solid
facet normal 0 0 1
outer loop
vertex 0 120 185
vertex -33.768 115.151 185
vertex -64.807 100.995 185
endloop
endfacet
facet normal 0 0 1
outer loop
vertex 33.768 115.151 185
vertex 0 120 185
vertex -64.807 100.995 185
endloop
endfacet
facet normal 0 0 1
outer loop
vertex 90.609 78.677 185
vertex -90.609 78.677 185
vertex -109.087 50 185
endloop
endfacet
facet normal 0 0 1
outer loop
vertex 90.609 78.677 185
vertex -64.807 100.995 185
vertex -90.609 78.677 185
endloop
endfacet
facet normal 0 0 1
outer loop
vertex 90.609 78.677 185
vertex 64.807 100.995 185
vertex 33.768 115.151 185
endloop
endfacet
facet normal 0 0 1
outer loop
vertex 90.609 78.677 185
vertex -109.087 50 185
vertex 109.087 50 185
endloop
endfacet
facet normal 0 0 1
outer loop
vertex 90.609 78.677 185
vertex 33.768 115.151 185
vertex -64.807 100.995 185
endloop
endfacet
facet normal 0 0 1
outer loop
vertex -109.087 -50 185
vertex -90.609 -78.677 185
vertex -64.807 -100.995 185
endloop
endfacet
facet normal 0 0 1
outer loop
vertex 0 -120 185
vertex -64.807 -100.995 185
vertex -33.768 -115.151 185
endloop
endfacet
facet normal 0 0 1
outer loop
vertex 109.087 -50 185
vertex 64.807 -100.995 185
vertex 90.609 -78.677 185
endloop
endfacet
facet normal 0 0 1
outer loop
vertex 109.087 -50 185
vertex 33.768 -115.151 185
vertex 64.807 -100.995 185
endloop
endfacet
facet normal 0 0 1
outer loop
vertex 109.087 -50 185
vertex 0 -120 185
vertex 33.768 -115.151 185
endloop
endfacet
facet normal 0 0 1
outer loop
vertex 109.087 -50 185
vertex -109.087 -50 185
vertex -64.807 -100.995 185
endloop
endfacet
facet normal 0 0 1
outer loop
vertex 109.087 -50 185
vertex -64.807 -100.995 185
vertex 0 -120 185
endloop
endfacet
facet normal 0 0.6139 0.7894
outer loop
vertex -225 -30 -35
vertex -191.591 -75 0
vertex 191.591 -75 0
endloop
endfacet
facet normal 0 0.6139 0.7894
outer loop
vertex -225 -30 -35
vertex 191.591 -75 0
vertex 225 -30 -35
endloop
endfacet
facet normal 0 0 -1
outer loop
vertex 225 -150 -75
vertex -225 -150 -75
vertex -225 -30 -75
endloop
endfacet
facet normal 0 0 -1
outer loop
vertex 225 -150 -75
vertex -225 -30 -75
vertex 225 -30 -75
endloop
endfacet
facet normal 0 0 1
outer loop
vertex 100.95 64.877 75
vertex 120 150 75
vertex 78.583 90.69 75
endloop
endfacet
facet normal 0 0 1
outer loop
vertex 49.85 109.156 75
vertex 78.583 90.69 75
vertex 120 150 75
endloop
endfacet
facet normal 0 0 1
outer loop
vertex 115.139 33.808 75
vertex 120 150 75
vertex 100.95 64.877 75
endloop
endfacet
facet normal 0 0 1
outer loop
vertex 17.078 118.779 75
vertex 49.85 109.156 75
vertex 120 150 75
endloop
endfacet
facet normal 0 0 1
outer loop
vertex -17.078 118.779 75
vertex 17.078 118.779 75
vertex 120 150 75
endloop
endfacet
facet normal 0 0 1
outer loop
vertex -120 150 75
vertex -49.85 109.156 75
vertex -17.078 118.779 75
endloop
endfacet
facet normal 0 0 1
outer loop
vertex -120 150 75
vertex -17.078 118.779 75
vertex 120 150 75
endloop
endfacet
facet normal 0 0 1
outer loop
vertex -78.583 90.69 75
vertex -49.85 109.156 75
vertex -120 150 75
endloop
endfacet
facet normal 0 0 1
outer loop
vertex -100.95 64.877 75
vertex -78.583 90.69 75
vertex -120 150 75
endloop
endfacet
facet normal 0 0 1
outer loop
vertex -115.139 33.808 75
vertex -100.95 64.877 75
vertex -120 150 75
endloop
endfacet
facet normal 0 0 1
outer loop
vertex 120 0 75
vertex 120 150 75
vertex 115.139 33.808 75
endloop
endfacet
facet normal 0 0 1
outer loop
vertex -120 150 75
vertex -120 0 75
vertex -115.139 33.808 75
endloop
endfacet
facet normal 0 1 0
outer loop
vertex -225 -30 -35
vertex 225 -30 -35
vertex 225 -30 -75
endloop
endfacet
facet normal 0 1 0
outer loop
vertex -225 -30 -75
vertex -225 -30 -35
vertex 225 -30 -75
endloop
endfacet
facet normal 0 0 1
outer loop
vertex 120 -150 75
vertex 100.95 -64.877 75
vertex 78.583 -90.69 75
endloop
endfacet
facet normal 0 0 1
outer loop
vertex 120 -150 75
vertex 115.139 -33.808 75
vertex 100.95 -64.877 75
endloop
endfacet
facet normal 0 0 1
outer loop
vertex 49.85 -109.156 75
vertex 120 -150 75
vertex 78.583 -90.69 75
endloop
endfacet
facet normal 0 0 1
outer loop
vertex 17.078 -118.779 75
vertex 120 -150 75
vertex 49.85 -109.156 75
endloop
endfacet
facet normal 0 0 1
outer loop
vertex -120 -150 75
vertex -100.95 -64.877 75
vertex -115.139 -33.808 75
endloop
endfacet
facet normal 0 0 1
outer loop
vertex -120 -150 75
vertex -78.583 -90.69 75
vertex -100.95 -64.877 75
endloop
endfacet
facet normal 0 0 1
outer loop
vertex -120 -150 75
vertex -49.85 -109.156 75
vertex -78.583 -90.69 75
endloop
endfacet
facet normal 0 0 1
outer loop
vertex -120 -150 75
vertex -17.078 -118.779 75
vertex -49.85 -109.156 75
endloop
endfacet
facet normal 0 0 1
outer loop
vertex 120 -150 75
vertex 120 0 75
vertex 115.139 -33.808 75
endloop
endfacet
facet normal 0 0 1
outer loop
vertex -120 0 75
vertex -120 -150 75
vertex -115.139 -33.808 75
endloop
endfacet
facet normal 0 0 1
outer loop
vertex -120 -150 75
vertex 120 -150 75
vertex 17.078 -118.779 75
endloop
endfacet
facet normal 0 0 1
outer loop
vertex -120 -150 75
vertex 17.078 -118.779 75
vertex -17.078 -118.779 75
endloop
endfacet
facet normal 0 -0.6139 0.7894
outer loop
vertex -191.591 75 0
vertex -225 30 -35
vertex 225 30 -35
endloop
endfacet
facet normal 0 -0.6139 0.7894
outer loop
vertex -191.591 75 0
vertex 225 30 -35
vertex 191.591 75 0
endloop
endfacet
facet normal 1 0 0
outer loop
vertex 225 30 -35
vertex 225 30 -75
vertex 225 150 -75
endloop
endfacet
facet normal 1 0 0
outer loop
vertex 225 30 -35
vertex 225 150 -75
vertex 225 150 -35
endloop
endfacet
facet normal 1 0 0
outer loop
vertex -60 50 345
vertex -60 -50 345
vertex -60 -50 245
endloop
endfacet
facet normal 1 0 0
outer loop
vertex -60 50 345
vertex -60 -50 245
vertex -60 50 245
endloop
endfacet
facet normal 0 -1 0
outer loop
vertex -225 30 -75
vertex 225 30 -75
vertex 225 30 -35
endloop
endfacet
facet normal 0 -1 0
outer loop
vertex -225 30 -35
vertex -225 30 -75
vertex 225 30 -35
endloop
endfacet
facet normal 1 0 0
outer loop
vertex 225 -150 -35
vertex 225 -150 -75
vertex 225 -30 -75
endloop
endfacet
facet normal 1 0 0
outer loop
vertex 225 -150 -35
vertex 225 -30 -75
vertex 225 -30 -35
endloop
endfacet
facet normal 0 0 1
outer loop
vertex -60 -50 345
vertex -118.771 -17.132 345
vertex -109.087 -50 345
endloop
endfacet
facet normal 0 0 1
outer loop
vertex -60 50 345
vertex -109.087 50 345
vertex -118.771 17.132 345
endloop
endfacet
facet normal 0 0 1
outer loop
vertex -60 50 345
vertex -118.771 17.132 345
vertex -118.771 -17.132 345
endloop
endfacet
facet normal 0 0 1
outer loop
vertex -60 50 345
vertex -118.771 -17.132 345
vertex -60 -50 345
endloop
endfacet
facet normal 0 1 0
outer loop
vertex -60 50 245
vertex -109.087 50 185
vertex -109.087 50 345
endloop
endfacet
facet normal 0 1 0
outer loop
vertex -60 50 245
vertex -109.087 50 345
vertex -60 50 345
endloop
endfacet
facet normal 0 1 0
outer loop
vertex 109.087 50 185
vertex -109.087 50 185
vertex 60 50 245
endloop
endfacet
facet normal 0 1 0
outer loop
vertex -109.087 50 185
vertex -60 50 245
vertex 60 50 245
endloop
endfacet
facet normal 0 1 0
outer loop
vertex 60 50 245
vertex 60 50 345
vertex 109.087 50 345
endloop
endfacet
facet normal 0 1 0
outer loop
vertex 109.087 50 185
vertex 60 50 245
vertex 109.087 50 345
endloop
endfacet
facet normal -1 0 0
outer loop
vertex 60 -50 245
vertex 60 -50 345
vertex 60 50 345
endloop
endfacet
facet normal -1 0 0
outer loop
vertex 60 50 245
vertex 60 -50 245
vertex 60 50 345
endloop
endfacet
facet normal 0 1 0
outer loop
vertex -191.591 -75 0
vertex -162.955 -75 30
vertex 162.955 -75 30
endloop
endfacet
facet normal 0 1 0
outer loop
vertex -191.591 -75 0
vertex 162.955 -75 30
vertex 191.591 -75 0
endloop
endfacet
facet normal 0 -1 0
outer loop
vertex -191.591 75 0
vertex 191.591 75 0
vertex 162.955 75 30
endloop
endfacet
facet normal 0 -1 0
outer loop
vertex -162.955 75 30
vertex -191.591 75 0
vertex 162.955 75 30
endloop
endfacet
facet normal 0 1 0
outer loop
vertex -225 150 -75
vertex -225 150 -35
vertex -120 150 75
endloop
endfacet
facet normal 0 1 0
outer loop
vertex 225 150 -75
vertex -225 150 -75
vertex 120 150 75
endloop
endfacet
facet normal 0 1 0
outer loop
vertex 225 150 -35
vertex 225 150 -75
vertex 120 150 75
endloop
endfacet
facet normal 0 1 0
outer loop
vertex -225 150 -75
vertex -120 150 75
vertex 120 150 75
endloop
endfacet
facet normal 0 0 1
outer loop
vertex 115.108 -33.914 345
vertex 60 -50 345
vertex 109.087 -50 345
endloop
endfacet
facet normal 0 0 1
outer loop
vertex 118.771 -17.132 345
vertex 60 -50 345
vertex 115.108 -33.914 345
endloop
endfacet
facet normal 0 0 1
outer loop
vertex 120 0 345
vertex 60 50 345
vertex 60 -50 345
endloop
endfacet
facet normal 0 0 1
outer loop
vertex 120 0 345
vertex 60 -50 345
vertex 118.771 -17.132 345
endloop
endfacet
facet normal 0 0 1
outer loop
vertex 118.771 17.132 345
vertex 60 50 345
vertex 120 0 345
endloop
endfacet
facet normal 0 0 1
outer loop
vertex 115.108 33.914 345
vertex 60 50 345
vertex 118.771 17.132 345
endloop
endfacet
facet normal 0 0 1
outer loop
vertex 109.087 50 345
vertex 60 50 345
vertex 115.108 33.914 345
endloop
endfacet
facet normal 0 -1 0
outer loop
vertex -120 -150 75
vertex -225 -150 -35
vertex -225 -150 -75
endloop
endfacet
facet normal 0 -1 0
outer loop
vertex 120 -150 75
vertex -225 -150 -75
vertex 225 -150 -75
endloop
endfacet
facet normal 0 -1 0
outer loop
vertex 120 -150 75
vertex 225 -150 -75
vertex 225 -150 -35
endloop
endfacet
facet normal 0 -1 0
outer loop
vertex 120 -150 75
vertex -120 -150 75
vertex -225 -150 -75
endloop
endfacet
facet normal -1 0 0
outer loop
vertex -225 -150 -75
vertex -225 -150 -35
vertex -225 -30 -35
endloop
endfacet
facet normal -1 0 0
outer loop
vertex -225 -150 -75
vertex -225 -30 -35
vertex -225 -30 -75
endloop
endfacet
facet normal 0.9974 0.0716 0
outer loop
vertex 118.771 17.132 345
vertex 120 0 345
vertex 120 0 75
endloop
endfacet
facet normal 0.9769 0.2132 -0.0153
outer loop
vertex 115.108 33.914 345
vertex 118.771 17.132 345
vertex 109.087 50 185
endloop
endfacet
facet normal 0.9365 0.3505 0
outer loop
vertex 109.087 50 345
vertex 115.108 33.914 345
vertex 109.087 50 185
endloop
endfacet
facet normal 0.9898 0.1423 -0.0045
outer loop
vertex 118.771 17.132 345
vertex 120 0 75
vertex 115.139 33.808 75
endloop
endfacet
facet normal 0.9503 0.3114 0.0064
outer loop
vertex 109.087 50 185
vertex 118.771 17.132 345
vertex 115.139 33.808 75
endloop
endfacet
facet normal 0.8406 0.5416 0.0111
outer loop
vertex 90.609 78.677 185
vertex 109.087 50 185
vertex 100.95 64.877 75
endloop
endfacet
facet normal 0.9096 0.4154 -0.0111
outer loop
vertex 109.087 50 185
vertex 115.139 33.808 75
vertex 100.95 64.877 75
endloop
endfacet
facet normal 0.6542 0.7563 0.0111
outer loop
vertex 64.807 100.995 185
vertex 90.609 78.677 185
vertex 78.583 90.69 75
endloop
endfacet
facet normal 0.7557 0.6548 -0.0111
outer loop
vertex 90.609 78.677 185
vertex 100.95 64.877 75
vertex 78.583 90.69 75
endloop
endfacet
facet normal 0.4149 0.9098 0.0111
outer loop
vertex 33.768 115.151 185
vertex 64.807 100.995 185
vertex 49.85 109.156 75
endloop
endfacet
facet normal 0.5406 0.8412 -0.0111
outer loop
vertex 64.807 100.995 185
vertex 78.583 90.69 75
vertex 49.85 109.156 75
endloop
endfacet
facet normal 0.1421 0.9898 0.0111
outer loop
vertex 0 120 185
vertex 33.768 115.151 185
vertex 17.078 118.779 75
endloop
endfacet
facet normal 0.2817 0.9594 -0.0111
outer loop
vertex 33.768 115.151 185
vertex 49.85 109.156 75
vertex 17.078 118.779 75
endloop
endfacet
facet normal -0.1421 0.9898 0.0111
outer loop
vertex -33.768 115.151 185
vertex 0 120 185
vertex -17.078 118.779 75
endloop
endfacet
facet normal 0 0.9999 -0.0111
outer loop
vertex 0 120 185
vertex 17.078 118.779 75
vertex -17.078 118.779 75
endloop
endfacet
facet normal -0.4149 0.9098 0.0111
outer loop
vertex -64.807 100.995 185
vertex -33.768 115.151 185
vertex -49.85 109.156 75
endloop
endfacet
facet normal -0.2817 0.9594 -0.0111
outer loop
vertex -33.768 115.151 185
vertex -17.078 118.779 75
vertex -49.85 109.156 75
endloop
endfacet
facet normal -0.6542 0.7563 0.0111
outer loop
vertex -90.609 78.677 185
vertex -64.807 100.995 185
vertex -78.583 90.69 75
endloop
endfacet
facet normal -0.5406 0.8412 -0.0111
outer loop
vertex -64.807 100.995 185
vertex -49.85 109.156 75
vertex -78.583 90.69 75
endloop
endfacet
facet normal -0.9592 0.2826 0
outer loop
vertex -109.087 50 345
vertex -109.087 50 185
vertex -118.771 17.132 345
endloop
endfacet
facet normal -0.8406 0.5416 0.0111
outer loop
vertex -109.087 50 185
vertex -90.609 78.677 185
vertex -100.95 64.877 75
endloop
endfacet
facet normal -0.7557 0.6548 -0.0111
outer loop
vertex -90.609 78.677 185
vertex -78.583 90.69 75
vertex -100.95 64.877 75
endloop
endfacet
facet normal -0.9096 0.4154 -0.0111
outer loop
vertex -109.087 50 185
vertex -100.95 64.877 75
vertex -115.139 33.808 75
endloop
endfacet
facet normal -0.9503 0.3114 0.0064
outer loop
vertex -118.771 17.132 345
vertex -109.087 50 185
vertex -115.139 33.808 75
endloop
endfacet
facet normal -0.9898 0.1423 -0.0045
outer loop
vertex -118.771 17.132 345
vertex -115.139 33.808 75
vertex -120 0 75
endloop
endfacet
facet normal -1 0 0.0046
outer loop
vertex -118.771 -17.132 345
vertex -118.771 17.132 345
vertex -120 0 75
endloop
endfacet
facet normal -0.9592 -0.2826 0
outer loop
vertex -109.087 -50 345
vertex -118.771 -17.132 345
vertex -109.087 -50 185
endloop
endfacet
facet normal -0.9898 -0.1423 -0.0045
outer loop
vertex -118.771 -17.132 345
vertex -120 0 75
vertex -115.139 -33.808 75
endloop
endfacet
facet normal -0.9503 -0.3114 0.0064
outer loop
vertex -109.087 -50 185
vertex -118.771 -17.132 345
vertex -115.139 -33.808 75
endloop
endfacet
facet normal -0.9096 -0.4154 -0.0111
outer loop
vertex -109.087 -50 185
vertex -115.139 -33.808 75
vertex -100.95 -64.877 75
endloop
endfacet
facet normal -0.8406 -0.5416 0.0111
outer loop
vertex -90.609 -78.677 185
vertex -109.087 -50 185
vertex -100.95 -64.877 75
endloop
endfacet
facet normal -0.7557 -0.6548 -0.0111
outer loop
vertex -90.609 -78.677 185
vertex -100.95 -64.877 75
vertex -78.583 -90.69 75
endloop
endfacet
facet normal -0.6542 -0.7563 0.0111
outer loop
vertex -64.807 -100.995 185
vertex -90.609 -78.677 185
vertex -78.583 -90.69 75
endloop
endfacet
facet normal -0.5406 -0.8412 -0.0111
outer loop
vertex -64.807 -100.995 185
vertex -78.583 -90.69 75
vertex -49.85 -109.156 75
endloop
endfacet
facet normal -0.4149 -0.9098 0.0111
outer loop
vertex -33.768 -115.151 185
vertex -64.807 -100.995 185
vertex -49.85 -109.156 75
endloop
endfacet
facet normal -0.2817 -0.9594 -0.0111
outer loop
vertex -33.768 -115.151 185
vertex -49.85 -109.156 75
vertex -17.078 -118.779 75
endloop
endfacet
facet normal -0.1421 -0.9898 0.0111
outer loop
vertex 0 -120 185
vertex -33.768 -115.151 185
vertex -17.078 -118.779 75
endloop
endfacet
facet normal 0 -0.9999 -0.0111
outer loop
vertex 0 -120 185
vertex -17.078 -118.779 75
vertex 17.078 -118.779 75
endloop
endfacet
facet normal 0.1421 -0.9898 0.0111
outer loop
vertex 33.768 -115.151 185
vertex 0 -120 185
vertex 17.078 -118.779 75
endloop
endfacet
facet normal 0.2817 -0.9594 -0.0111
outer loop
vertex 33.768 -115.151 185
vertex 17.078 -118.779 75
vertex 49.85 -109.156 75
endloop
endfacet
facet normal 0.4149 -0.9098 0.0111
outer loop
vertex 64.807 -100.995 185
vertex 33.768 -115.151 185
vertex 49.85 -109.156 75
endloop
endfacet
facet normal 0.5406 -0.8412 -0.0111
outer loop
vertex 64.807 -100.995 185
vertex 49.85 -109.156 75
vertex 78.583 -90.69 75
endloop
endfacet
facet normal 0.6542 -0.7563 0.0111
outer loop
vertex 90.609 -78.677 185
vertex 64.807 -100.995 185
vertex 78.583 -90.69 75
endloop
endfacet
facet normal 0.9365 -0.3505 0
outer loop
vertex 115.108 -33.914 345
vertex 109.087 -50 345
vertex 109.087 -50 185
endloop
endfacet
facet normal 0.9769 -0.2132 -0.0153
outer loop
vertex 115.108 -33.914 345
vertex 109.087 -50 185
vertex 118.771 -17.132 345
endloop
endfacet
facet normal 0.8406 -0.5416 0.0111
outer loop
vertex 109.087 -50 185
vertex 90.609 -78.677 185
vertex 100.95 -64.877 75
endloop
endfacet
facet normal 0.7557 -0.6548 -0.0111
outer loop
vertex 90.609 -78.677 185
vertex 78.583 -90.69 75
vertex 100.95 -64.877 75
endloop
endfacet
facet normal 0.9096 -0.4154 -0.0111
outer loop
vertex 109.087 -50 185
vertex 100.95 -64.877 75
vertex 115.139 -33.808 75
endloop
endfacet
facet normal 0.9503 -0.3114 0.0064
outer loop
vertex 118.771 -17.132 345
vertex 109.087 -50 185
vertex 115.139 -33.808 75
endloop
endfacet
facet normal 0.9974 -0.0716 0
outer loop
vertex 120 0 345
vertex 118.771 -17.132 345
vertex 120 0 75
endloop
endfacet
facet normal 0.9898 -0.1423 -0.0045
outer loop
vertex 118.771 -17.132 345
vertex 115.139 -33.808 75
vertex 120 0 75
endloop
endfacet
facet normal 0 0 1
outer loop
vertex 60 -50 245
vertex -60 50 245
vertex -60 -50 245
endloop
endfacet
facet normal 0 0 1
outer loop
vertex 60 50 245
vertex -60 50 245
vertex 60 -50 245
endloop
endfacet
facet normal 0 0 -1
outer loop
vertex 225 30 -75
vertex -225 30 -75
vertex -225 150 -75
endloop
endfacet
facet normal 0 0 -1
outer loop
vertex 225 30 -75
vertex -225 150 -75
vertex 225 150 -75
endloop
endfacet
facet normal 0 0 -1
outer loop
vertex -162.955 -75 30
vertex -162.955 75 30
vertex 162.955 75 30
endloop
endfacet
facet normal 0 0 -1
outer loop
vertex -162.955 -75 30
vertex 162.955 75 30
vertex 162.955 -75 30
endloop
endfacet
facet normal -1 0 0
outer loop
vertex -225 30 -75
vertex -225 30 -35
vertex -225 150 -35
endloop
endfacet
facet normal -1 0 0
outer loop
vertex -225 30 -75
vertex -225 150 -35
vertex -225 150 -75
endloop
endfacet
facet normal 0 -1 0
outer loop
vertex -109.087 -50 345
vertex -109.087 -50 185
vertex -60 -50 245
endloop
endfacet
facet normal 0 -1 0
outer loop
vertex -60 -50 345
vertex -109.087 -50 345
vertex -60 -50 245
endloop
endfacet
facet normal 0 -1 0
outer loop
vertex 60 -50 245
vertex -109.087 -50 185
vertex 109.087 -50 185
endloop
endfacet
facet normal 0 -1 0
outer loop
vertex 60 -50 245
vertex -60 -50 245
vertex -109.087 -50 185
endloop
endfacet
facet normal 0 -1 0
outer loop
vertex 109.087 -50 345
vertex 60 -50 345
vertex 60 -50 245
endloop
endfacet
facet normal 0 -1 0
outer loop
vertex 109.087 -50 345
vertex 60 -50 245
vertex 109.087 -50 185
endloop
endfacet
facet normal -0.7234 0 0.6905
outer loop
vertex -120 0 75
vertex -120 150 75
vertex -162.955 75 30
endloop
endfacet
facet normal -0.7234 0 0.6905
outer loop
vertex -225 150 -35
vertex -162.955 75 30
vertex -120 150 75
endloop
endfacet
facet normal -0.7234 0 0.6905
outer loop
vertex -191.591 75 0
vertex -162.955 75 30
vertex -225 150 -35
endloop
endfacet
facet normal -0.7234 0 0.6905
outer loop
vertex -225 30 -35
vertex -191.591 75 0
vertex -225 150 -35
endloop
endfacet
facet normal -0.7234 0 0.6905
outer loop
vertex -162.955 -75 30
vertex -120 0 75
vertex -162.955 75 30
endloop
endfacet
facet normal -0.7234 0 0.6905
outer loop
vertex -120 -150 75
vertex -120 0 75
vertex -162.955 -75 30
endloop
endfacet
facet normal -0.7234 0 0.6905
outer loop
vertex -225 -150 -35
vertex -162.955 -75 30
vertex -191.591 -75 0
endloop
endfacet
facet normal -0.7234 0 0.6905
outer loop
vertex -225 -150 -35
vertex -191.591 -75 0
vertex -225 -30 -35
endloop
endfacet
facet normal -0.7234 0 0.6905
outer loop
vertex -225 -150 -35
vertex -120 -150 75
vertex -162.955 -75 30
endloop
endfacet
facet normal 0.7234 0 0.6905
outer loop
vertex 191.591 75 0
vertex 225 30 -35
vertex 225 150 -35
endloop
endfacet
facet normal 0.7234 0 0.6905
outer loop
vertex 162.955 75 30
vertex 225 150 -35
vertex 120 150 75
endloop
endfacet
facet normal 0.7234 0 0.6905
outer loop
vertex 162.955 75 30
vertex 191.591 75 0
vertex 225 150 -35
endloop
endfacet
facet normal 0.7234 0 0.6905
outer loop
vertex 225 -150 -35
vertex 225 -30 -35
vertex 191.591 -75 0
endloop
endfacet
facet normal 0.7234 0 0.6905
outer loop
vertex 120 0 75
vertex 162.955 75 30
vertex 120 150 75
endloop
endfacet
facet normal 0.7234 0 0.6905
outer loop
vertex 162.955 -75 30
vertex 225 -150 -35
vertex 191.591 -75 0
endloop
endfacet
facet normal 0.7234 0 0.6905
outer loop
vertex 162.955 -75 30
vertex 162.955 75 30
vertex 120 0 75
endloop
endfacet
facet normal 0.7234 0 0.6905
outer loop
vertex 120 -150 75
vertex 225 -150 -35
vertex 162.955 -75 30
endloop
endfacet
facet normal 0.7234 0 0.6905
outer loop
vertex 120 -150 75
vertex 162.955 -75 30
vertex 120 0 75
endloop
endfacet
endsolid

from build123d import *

# Parameters (mm, degrees)
F1_DEPTH = 150
F2_R     = 120
F3_DEPTH = 270
F4_W     = 717.304408
F4_H     = 111.2508
F4_W_2   = 697.326451
F4_H_2   = 148.352754
F5_DEPTH = 160
F6_W     = 120
F6_H     = 100
F7_DEPTH = 100
F9_DEPTH = 450.001


with BuildPart() as f1:
    # F0 (on Front) → F1 (new body, symmetric)
    with BuildSketch(Plane.XZ):
        Polygon((-225, -75), (225, -75), (225, -35), (120, 75), (-120, 75), (-225, -35), align=None)
    extrude(amount=F1_DEPTH, both=True)

    # F2 (on face) → F3 (join)
    with BuildSketch(Plane.XY.offset(75)):
        Circle(F2_R)
    extrude(amount=F3_DEPTH)

    # F4 (on face) → F5 (cut)
    with BuildSketch(Plane.XY.offset(345)):
        with Locations((0, 105.6254)):
            Rectangle(F4_W, F4_H)
        with Locations((9.988979, -124.176377)):
            Rectangle(F4_W_2, F4_H_2)
    extrude(amount=-F5_DEPTH, mode=Mode.SUBTRACT)

    # F6 (on face) → F7 (cut)
    with BuildSketch(Plane.XY.offset(345)):
        Rectangle(F6_W, F6_H)
    extrude(amount=-F7_DEPTH, mode=Mode.SUBTRACT)

    # F8 (on face) → F9 (cut, through all)
    with BuildSketch(Plane.YZ.offset(225)):
        Polygon((-30, -35), (-30, -75), (30, -75), (30, -35), (75, 0), (75, 30), (-75, 30), (-75, 0), align=None)
    extrude(amount=-F9_DEPTH, mode=Mode.SUBTRACT)


solid = f1.part
